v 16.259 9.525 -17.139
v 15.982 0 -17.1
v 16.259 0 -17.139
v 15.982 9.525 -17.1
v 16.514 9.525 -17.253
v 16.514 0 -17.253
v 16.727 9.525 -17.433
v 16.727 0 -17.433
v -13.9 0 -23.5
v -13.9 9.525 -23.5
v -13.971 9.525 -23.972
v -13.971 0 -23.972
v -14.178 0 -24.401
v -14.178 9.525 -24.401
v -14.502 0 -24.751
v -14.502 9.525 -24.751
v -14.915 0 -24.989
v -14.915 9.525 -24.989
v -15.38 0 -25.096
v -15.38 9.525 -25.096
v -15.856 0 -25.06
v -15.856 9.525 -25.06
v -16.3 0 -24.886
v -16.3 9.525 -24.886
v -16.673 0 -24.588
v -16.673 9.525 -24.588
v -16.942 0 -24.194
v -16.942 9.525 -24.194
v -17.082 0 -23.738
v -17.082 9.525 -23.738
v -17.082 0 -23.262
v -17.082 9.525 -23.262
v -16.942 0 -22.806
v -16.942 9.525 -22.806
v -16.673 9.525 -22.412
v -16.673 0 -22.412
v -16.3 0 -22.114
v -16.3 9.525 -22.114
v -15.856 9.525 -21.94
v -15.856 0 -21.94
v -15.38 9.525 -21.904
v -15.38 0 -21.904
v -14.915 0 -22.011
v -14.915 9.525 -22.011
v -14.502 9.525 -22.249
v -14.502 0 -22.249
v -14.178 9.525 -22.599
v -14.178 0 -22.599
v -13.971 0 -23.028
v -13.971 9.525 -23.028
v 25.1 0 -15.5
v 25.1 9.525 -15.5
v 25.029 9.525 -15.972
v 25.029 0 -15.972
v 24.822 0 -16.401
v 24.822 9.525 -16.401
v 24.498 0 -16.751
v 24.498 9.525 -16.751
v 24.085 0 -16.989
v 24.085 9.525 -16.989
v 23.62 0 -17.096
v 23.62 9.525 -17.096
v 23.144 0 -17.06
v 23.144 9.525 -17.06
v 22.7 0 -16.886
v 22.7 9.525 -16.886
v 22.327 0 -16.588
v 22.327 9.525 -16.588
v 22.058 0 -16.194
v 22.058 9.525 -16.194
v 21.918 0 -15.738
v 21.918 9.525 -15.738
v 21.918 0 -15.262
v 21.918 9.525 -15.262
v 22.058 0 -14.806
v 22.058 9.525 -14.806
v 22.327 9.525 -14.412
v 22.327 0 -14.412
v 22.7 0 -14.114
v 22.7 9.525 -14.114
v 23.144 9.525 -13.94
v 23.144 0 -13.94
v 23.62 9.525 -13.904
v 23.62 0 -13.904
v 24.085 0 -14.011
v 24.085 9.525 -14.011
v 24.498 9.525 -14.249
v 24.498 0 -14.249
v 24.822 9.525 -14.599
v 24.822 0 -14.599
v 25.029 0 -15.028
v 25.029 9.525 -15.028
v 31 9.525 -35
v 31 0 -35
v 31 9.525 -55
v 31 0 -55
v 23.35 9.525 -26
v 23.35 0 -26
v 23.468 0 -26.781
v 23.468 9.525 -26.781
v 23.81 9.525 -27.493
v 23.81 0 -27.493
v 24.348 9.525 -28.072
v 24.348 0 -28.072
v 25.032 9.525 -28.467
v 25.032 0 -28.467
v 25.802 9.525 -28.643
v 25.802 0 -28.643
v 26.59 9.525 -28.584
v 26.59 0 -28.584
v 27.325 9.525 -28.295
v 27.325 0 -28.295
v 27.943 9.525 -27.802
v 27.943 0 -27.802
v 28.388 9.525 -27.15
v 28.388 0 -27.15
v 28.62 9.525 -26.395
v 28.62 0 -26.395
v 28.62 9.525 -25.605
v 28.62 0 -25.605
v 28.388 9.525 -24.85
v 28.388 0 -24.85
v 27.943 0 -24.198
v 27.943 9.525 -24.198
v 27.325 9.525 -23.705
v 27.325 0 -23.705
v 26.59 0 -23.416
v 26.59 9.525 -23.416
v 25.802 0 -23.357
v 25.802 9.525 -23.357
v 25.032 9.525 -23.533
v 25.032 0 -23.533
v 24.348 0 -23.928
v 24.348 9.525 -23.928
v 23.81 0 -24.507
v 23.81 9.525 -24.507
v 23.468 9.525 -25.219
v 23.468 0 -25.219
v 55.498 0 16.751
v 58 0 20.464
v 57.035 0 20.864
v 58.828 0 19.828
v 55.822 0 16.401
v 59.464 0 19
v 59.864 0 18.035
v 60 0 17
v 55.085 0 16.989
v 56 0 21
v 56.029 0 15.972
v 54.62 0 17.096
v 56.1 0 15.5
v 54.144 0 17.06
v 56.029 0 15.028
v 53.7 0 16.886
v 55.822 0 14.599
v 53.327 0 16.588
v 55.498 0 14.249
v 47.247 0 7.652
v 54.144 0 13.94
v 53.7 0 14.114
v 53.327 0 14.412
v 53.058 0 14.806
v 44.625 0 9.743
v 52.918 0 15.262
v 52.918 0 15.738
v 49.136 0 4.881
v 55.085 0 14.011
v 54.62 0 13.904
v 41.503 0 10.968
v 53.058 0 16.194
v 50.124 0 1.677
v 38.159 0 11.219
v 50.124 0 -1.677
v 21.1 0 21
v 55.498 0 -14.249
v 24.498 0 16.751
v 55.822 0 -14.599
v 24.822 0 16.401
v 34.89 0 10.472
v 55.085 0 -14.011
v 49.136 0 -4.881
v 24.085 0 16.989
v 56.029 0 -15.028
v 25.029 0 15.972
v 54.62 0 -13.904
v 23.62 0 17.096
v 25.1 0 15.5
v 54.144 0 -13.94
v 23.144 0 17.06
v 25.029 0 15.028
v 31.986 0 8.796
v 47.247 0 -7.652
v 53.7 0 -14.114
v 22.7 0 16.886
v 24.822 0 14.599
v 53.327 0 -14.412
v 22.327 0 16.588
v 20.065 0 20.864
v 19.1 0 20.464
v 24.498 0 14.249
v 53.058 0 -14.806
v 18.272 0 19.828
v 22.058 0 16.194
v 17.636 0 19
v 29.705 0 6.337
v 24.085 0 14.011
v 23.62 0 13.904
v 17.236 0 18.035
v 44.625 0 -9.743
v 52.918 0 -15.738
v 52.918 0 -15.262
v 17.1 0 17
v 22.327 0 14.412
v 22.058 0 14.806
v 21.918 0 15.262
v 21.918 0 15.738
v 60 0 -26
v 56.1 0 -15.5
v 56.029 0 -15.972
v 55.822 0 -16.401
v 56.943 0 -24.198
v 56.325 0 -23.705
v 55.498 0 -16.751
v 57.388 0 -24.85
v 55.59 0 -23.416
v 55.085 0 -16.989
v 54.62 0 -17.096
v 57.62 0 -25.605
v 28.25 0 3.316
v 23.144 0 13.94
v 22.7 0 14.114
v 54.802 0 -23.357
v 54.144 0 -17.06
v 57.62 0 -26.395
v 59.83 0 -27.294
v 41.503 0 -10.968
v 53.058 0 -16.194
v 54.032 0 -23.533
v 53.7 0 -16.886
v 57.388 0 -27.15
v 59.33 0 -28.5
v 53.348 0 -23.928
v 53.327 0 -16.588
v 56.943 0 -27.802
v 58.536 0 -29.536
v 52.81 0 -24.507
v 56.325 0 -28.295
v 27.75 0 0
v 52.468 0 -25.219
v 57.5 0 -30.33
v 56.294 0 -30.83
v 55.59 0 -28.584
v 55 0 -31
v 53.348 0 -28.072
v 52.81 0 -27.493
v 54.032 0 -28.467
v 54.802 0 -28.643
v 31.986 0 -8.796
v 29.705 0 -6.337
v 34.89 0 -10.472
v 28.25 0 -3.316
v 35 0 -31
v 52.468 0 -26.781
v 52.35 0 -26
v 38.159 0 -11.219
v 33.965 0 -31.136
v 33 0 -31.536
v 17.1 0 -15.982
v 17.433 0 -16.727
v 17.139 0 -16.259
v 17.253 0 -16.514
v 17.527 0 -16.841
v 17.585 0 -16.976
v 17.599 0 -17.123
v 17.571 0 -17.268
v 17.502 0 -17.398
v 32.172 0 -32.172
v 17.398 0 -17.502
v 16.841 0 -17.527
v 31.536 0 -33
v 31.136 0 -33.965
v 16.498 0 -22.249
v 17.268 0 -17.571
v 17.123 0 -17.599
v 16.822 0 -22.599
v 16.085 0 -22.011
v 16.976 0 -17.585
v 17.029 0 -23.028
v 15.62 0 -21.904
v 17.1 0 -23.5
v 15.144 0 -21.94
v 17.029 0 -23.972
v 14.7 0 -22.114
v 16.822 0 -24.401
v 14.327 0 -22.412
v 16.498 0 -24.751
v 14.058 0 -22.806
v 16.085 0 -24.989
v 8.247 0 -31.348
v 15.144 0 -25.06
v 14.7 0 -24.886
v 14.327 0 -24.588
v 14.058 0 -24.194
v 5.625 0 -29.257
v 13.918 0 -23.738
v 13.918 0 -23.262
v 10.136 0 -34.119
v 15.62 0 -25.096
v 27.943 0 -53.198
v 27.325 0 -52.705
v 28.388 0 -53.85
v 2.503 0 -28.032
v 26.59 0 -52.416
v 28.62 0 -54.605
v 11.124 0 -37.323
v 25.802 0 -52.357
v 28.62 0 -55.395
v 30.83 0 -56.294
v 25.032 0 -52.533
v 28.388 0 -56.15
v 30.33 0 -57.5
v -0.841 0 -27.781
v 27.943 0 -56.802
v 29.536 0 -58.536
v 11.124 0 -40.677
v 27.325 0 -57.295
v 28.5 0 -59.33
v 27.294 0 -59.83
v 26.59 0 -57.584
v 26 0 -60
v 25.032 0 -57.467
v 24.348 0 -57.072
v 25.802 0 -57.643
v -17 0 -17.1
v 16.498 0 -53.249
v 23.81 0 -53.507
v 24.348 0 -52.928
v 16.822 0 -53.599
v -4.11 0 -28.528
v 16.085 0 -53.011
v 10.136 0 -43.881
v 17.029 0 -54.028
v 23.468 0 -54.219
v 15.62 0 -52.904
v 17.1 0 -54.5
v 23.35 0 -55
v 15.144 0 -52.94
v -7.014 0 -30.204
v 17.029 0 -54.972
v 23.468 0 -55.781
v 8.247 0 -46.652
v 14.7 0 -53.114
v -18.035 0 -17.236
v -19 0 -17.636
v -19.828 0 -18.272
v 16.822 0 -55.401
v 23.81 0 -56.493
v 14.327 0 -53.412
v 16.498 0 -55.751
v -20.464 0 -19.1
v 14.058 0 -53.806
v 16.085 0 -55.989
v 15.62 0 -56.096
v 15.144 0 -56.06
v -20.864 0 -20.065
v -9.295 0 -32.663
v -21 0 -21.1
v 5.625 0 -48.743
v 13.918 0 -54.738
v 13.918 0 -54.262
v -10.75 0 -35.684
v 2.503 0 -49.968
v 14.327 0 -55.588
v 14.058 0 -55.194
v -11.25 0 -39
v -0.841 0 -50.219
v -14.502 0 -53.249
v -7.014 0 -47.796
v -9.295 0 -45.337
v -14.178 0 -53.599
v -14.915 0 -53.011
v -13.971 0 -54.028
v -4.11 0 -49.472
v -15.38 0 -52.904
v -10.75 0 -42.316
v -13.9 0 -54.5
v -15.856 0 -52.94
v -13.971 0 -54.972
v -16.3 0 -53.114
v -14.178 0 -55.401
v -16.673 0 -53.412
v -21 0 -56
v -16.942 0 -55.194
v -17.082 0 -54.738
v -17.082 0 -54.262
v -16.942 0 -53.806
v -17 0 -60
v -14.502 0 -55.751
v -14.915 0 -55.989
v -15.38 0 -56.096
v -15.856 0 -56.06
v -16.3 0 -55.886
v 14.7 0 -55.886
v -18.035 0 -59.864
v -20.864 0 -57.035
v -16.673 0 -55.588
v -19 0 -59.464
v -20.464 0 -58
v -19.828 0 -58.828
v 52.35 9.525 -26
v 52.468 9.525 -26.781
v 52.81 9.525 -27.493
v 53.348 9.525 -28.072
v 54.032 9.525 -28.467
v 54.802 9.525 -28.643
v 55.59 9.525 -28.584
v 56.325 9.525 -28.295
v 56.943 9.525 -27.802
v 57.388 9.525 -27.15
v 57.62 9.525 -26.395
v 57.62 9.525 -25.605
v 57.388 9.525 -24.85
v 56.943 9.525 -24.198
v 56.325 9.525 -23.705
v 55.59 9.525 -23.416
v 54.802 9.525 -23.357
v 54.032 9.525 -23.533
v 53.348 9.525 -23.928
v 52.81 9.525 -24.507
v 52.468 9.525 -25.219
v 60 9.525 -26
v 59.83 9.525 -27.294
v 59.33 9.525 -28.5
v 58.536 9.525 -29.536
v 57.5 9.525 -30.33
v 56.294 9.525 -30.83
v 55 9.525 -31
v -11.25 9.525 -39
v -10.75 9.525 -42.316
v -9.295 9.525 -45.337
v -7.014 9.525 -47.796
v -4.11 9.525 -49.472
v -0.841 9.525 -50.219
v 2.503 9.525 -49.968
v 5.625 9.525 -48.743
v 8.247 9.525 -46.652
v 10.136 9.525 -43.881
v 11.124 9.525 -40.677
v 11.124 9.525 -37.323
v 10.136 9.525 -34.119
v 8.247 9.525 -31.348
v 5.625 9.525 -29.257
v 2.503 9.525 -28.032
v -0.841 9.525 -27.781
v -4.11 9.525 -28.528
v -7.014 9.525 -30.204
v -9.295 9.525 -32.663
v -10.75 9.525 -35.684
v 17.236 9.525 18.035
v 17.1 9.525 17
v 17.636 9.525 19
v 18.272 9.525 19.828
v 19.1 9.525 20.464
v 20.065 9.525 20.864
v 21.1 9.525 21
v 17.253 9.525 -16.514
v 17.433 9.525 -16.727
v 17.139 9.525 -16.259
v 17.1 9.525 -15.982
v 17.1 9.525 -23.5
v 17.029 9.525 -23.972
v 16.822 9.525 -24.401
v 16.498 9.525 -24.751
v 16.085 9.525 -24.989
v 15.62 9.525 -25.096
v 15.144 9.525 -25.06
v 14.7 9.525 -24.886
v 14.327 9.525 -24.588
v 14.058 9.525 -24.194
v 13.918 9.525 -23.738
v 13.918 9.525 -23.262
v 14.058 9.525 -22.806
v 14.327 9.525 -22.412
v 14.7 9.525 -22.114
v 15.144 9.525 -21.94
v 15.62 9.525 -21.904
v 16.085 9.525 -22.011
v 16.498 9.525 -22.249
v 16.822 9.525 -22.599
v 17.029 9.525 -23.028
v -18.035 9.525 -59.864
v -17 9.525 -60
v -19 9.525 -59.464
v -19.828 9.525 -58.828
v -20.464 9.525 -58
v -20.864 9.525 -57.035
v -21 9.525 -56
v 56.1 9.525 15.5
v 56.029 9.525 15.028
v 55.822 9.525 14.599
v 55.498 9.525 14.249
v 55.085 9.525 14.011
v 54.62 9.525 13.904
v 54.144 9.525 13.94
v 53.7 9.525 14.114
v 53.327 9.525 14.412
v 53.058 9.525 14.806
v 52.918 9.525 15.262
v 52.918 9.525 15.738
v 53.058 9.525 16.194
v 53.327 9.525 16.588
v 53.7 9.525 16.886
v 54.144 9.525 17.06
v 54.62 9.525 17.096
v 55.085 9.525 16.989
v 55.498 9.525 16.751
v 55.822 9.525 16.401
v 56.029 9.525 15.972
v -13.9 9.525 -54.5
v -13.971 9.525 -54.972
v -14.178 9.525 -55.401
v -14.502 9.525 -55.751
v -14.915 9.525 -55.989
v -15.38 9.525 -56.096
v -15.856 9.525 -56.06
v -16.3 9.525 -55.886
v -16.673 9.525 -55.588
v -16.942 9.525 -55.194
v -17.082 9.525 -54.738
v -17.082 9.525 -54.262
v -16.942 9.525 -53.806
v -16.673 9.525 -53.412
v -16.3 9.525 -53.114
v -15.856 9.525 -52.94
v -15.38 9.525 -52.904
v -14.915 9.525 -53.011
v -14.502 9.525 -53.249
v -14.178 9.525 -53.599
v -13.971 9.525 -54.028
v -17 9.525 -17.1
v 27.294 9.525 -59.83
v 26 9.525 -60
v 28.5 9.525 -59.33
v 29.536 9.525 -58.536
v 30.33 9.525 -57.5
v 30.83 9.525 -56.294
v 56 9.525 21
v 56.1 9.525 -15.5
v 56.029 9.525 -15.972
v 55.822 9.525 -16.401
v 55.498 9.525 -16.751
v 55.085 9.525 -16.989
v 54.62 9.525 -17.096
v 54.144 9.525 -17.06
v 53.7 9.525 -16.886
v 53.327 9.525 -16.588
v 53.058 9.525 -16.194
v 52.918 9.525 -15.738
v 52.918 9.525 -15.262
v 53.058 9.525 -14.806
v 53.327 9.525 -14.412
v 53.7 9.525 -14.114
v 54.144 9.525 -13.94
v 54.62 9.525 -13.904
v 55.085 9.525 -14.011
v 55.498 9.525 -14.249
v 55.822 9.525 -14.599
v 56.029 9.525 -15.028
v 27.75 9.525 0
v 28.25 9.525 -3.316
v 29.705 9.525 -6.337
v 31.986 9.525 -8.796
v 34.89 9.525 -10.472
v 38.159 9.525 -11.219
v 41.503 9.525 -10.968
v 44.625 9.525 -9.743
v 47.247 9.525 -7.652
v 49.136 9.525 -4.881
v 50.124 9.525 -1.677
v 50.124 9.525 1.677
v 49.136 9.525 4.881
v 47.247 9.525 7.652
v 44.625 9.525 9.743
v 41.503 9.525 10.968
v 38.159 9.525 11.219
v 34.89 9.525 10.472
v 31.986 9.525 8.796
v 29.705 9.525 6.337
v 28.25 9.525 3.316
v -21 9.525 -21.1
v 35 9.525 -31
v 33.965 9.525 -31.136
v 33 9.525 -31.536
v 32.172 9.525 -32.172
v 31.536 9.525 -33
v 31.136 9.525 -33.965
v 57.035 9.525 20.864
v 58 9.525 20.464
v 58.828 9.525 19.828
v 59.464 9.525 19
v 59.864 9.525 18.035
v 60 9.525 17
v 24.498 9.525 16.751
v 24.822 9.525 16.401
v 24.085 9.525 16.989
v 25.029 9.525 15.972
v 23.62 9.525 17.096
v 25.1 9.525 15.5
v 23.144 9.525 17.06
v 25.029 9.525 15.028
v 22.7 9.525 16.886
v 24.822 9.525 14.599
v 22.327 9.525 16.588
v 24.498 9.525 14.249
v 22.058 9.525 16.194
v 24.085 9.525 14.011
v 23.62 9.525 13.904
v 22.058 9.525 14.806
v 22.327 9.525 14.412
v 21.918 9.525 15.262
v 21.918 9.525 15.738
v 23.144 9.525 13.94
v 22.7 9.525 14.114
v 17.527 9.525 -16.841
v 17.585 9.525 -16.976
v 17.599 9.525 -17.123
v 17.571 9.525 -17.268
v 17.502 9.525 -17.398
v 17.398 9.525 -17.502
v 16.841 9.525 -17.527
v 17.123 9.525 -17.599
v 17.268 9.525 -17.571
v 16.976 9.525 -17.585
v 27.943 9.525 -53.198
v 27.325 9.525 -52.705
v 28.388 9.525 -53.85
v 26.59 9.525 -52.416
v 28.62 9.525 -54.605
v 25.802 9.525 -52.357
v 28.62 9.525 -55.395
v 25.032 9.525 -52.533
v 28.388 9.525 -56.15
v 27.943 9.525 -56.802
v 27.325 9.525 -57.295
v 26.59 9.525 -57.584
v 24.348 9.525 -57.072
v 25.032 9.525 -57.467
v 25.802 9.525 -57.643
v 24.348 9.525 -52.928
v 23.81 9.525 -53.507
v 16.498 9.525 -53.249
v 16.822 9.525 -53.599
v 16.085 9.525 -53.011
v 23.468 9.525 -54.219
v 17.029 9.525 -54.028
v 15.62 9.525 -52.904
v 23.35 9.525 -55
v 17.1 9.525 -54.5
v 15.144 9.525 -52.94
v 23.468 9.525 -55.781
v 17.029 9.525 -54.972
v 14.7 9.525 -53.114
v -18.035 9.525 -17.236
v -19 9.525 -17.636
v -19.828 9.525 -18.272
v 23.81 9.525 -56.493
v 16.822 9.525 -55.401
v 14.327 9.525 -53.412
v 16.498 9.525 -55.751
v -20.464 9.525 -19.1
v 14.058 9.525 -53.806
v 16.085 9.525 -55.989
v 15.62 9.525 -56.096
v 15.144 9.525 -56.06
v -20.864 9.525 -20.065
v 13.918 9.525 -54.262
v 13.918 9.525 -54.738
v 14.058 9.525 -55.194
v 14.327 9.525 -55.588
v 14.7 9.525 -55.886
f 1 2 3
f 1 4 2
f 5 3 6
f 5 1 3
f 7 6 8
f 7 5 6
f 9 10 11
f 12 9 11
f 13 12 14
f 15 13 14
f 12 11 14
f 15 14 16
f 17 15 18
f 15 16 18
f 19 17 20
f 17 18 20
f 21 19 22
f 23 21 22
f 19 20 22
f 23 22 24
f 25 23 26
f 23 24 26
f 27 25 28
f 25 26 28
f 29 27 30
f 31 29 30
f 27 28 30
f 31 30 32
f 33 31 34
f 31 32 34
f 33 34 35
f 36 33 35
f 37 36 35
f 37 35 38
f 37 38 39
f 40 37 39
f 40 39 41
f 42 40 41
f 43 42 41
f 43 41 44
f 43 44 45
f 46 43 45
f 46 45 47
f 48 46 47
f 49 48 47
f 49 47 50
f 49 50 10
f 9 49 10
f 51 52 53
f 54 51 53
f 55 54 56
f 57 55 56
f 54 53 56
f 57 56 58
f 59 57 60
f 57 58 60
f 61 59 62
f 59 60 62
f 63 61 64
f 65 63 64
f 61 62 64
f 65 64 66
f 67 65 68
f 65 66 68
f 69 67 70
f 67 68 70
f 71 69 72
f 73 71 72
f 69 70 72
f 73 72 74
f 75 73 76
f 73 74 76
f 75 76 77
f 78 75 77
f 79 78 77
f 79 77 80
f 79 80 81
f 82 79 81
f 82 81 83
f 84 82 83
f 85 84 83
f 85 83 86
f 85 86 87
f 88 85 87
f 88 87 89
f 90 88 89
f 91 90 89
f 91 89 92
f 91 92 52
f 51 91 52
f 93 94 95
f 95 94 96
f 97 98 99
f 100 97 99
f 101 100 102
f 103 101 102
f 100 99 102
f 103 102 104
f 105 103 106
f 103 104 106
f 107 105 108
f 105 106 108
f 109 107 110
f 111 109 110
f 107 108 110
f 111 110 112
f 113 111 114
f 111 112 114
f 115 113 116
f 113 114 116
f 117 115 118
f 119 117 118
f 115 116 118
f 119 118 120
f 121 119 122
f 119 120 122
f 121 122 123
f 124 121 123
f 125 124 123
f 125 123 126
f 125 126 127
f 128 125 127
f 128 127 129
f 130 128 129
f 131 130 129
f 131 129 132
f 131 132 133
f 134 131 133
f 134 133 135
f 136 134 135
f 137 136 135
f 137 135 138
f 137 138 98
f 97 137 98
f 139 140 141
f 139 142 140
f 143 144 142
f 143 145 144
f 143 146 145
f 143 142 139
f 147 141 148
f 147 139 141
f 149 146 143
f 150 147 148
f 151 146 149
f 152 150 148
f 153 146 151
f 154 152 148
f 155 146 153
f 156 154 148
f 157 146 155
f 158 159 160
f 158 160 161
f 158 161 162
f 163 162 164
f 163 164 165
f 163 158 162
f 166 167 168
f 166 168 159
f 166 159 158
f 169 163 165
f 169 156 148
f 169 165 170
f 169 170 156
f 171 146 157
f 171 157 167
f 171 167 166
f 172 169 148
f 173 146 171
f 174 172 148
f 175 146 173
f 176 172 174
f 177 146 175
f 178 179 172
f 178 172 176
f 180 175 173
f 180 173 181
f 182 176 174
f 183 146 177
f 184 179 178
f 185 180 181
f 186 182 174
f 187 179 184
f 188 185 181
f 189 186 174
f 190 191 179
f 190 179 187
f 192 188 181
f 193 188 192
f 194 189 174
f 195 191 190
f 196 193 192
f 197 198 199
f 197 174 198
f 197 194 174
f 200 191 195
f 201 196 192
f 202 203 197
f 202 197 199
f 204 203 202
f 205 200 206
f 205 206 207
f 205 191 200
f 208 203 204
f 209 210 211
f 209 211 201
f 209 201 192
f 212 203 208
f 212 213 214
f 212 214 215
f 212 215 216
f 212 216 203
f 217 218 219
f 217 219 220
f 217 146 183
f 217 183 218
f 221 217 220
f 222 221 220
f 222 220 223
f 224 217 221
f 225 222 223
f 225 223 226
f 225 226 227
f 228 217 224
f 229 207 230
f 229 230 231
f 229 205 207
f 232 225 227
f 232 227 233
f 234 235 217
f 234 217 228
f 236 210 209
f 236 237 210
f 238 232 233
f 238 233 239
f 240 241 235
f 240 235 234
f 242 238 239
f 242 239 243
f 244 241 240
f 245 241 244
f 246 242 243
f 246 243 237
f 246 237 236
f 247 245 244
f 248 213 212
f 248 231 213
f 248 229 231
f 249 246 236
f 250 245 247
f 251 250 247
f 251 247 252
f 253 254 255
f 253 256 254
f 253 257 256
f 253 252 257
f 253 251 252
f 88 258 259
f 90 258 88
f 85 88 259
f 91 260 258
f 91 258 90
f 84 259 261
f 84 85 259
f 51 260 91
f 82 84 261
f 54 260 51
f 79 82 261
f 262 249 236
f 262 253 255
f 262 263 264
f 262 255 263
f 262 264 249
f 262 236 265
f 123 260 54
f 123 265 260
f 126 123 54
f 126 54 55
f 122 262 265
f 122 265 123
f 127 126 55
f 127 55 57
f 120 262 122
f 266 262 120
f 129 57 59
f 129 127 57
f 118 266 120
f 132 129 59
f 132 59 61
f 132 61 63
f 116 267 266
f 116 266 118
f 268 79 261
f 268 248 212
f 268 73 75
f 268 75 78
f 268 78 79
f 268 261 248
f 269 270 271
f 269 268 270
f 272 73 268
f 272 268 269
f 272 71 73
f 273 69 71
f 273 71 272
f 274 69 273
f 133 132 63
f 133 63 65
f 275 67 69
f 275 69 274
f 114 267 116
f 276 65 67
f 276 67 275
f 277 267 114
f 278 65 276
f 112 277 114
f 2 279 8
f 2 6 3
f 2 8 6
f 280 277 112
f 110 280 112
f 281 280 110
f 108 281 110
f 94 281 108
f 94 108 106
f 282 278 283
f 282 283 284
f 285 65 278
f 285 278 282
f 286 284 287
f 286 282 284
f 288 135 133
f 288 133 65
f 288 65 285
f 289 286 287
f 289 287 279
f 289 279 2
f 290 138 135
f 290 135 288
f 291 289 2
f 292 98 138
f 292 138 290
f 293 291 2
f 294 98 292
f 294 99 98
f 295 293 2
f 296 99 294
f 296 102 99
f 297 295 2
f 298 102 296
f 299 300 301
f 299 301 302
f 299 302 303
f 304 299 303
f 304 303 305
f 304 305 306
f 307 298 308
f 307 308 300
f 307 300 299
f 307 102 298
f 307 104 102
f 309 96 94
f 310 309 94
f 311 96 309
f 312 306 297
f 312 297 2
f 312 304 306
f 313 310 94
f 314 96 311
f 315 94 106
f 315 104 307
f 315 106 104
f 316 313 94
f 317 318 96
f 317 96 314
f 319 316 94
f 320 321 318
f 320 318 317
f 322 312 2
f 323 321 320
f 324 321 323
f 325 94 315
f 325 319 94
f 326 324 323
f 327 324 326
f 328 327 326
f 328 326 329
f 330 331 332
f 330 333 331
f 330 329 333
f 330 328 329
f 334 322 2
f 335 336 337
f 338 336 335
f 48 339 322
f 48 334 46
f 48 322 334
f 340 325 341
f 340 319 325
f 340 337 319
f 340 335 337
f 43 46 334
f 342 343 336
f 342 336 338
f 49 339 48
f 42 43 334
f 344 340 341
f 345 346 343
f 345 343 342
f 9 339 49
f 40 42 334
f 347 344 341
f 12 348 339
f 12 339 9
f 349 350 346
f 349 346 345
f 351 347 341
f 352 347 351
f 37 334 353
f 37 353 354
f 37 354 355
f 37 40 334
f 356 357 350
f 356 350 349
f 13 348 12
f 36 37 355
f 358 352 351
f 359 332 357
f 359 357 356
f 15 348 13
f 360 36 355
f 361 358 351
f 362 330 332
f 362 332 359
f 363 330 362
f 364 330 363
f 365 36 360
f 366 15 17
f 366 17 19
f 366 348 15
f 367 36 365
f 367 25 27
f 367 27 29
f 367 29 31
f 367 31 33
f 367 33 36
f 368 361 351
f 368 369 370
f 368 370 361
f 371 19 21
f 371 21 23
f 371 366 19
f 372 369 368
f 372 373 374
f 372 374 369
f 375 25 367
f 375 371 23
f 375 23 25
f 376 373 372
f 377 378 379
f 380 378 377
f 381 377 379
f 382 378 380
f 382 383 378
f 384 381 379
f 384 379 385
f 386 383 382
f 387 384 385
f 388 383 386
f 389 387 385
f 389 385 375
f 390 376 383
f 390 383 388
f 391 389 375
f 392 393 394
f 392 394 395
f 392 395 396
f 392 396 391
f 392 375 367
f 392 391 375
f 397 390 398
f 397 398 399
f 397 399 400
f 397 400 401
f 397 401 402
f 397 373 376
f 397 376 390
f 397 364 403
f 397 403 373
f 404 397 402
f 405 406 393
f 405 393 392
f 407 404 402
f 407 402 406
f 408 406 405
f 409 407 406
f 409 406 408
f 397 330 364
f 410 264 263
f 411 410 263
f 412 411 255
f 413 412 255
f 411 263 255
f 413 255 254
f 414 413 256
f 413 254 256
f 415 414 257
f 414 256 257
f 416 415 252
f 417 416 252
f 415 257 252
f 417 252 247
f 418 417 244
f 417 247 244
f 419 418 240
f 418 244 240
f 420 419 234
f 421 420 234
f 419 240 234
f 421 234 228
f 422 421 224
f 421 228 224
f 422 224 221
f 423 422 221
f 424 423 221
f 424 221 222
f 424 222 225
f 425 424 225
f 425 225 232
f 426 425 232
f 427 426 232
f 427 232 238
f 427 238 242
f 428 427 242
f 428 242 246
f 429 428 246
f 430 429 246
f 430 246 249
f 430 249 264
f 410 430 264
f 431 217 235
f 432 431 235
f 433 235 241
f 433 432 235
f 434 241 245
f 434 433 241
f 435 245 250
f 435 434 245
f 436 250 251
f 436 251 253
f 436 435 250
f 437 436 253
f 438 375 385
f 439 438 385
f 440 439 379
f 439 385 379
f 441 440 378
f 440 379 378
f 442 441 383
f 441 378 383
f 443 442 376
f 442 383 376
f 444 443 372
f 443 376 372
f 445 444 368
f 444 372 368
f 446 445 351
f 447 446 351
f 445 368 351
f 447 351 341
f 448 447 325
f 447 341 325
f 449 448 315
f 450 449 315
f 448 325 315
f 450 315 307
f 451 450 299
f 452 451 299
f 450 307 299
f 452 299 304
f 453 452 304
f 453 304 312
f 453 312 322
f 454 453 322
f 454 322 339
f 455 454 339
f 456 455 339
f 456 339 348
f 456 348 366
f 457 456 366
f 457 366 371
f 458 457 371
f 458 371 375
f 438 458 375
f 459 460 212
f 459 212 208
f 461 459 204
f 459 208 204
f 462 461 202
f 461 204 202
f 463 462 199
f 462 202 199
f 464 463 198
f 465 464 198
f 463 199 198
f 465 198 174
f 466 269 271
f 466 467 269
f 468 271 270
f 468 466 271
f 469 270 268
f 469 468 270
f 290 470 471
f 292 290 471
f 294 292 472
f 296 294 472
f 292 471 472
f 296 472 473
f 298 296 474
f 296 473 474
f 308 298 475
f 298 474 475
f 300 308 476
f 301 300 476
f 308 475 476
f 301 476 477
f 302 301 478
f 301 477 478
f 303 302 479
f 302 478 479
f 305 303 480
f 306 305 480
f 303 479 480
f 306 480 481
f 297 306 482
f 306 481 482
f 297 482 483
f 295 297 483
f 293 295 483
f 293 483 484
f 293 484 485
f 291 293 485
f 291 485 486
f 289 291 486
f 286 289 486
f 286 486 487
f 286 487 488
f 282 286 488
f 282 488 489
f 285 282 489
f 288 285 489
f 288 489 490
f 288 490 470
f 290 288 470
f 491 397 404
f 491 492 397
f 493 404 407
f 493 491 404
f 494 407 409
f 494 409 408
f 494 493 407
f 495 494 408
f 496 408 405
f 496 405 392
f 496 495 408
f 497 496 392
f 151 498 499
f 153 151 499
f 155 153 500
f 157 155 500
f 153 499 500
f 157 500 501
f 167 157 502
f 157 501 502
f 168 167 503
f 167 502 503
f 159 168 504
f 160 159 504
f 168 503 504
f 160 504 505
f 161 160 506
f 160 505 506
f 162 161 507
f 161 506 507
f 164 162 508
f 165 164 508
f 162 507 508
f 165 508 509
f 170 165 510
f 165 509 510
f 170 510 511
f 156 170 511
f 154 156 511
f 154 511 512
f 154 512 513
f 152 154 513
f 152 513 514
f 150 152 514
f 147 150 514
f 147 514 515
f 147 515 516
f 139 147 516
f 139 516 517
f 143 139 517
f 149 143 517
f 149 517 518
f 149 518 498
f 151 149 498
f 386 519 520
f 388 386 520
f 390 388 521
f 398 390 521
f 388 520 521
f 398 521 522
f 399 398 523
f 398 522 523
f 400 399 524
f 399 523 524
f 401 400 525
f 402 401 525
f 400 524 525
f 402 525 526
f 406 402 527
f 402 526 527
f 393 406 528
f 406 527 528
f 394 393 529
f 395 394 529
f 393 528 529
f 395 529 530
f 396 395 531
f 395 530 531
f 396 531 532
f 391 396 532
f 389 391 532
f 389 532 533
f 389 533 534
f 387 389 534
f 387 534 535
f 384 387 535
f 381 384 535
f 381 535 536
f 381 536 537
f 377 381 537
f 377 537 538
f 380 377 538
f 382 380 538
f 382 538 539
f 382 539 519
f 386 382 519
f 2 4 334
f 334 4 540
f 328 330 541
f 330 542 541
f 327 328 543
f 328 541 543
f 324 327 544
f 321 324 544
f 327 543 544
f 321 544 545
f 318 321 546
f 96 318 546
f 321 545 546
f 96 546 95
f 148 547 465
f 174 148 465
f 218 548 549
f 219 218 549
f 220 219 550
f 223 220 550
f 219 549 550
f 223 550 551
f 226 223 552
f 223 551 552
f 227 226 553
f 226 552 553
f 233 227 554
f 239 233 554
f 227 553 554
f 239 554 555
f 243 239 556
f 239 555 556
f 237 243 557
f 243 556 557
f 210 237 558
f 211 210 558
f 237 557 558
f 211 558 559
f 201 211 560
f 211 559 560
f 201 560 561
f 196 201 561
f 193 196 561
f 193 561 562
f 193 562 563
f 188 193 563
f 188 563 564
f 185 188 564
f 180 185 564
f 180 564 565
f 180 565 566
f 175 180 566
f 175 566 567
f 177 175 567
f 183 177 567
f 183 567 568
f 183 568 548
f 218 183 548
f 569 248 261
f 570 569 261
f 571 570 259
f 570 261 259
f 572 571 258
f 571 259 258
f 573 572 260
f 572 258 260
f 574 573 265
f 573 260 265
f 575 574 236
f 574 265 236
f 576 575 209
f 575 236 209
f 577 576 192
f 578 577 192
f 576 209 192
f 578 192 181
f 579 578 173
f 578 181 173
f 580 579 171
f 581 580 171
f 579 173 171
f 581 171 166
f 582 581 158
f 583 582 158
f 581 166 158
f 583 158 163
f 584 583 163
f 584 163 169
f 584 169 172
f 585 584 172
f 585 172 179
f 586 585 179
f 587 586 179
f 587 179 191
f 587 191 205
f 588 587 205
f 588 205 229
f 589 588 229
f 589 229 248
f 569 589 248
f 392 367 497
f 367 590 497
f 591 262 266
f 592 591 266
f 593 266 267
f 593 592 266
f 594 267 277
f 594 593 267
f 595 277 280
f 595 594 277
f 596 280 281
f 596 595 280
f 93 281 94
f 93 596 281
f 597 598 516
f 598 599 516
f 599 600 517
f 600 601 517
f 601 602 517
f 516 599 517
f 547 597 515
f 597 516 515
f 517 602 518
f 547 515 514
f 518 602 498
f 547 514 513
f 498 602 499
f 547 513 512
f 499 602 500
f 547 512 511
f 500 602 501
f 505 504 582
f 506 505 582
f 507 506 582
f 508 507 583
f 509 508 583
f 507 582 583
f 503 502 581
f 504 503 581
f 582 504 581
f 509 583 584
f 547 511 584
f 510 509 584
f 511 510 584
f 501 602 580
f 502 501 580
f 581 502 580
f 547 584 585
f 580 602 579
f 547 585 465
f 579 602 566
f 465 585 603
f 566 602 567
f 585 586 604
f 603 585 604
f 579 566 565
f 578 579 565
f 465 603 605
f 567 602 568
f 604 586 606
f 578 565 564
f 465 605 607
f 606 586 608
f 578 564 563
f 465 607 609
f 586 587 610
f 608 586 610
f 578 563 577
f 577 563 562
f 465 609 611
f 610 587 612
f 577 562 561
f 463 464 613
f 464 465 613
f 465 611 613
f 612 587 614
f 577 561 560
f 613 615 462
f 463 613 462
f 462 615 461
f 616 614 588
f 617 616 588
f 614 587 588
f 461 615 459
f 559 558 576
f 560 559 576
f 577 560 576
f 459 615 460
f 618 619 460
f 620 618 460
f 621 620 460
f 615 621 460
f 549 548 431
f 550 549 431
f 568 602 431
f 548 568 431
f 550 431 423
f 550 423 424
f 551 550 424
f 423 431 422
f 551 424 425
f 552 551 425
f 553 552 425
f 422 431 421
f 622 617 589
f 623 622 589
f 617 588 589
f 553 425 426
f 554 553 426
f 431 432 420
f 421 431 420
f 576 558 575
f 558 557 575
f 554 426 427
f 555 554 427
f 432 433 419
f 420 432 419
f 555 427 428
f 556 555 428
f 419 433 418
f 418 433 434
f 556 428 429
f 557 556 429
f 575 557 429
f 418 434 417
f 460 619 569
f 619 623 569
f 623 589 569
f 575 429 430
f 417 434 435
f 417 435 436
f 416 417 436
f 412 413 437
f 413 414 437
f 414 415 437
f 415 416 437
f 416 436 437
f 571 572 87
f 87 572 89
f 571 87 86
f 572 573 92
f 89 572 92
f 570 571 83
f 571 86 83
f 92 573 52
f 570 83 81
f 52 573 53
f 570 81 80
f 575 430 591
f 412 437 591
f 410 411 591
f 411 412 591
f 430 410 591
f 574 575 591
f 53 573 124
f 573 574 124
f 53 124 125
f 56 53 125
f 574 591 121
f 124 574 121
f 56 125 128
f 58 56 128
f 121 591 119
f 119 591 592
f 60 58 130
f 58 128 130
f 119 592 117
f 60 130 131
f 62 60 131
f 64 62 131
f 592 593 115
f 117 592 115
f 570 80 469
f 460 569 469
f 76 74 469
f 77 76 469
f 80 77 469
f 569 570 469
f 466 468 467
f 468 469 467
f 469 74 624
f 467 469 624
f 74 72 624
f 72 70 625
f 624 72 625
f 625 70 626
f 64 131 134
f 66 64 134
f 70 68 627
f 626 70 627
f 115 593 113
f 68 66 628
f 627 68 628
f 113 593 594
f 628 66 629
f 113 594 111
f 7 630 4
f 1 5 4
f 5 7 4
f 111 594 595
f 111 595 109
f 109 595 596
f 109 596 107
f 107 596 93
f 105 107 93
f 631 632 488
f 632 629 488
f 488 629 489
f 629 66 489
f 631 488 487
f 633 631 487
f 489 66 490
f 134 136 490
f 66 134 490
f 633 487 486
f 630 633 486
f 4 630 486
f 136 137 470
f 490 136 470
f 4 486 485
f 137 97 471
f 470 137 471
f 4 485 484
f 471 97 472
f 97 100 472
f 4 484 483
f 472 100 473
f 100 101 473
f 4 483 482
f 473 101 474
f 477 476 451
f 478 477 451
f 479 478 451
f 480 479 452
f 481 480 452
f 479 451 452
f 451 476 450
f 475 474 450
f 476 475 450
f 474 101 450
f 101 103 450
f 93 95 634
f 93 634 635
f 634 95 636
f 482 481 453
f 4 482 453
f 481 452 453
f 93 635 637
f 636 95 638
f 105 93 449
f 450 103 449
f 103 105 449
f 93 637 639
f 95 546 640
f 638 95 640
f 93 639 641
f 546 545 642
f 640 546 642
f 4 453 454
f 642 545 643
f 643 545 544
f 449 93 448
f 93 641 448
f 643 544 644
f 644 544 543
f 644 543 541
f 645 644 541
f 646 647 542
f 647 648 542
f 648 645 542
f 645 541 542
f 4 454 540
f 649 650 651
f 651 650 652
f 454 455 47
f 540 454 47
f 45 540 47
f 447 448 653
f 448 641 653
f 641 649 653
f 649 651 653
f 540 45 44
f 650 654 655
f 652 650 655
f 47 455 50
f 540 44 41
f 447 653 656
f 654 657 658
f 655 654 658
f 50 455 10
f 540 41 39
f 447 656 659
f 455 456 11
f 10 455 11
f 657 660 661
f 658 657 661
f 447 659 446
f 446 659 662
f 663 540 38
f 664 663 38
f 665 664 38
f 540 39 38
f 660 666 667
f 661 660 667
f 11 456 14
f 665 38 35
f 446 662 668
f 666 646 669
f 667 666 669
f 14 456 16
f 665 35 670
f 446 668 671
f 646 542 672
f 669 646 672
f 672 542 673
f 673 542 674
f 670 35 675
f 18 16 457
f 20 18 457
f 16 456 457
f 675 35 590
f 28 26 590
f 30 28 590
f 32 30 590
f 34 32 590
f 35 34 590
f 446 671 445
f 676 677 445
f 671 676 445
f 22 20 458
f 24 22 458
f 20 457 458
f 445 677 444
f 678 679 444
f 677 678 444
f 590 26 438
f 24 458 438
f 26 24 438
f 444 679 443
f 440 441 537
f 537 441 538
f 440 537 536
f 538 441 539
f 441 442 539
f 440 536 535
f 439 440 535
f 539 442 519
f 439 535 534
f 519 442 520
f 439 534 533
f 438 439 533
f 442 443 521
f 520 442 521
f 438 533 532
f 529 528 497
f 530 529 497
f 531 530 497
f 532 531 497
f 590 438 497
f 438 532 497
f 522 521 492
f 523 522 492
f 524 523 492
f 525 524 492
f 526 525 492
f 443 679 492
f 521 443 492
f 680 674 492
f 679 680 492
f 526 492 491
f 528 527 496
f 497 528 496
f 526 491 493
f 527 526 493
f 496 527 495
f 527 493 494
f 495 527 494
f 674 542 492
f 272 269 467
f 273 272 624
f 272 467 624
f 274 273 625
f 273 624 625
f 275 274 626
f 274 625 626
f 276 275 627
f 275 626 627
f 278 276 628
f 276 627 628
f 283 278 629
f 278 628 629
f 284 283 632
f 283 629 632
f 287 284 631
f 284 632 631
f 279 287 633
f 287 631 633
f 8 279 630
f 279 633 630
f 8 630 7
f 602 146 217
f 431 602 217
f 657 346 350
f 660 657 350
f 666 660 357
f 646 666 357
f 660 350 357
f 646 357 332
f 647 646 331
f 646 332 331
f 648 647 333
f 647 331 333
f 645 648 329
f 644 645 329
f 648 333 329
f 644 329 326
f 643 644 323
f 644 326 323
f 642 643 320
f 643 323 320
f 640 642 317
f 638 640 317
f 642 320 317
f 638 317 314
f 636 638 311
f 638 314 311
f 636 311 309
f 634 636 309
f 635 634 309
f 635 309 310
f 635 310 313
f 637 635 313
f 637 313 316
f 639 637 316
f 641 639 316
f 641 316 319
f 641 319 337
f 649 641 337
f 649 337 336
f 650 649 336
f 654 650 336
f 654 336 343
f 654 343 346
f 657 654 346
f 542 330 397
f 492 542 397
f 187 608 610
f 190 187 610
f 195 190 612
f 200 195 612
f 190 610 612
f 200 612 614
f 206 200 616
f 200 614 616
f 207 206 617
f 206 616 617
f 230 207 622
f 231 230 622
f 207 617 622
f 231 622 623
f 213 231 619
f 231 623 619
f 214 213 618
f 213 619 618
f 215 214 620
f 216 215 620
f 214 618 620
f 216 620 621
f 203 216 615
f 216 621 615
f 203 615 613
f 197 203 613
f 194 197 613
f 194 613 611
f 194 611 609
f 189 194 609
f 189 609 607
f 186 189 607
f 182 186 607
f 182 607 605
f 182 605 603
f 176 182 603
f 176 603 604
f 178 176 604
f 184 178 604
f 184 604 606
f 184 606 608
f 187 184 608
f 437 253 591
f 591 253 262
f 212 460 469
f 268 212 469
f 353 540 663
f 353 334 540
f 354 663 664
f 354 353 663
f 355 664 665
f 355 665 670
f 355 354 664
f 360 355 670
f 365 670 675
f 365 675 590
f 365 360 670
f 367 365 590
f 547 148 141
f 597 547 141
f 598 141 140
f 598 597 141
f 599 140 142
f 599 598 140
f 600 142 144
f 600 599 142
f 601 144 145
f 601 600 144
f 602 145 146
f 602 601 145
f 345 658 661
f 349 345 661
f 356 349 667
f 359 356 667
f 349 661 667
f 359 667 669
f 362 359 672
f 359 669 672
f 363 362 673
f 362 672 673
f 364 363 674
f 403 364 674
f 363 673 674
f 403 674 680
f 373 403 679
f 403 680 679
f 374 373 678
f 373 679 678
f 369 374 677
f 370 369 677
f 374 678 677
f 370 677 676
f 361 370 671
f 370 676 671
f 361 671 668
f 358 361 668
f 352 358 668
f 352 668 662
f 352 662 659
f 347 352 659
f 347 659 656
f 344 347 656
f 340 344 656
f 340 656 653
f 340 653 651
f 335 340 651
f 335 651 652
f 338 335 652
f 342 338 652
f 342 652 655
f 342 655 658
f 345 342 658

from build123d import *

# Parameters (mm, degrees)
BOSS_EXTRUDE1_DEPTH          = 9.525
F_22_5_22_5_DIAMETER_HOLE1_D = 22.5
M3_CLEARANCE_HOLE1_D         = 3.2
M5_CLEARANCE_HOLE1_D         = 5.3
BOSS_EXTRUDE2_DEPTH          = 9.525
SKETCH17_R                   = 0.5
CUT_EXTRUDE1_DEPTH           = 9.525
FILLET2_R                    = 4
FILLET3_R                    = 5
FILLET4_R                    = 1


with BuildPart() as part:
    # Sketch1 → Boss-Extrude1 (new body)
    with BuildSketch(Plane(origin=(0, 0, 0), x_dir=(1, 0, 0), z_dir=(0, 1, 0))):
        Polygon((60, -21), (60, 31), (31, 31), (31, 60), (-21, 60), (-21, 18), (18, 18), (18, -21), align=None)
    extrude(amount=BOSS_EXTRUDE1_DEPTH)

    # Ø22.5 (22.5) Diameter Hole1 (through all)
    with Locations(Plane(origin=(0, 9.525, 0), x_dir=(1, 0, 0), z_dir=(0, 1, 0))):
        with Locations((0, 39), (39, 0)):
            Hole(F_22_5_22_5_DIAMETER_HOLE1_D / 2)

    # M3 Clearance Hole1 (through all)
    with Locations(Plane(origin=(0, 0, 0), x_dir=(-1, 0, 0), z_dir=(0, -1, 0))):
        with Locations((-54.5, 15.5), (-23.5, 15.5), (-23.5, -15.5), (-54.5, -15.5), (-15.5, 54.5), (-15.5, 23.5), (15.5, 23.5), (15.5, 54.5)):
            Hole(M3_CLEARANCE_HOLE1_D / 2)

    # M5 Clearance Hole1 (through all)
    with Locations(Plane(origin=(0, 9.525, 0), x_dir=(1, 0, 0), z_dir=(0, 1, 0))):
        with Locations((26, 55), (26, 26), (55, 26)):
            Hole(M5_CLEARANCE_HOLE1_D / 2)

    # Sketch16 → Boss-Extrude2 (add)
    with BuildSketch(Plane(origin=(0, 9.525, 0), x_dir=(1, 0, 0), z_dir=(0, 1, 0))):
        Polygon((17.1, 17.1), (-21, 17.1), (-21, 18), (18, 18), (18, -21), (17.1, -21), align=None)
    extrude(amount=-BOSS_EXTRUDE2_DEPTH)

    # Sketch17 → Cut-Extrude1 (cut)
    with BuildSketch(Plane(origin=(0, 9.525, 0), x_dir=(1, 0, 0), z_dir=(0, 1, 0))):
        with Locations((17.1, 17.1)):
            Circle(SKETCH17_R)
    extrude(amount=-CUT_EXTRUDE1_DEPTH, mode=Mode.SUBTRACT)

    # Fillet2
    fillet2_edges = [part.edges().sort_by_distance(p)[0] for p in [
        (17.1, 4.7625, 21),
        (-21, 4.7625, -17.1),
        (-21, 4.7625, -60),
        (31, 4.7625, -31),
        (60, 4.7625, 21),
    ]]
    fillet(fillet2_edges, radius=FILLET2_R)

    # Fillet3
    fillet3_edges = [part.edges().sort_by_distance(p)[0] for p in [
        (31, 4.7625, -60),
        (60, 4.7625, -31),
    ]]
    fillet(fillet3_edges, radius=FILLET3_R)

    # Fillet4
    fillet4_edges = [part.edges().sort_by_distance(p)[0] for p in [
        (16.6, 4.7625, -17.1),
        (17.1, 4.7625, -16.6),
    ]]
    fillet(fillet4_edges, radius=FILLET4_R)


solid = part.part
